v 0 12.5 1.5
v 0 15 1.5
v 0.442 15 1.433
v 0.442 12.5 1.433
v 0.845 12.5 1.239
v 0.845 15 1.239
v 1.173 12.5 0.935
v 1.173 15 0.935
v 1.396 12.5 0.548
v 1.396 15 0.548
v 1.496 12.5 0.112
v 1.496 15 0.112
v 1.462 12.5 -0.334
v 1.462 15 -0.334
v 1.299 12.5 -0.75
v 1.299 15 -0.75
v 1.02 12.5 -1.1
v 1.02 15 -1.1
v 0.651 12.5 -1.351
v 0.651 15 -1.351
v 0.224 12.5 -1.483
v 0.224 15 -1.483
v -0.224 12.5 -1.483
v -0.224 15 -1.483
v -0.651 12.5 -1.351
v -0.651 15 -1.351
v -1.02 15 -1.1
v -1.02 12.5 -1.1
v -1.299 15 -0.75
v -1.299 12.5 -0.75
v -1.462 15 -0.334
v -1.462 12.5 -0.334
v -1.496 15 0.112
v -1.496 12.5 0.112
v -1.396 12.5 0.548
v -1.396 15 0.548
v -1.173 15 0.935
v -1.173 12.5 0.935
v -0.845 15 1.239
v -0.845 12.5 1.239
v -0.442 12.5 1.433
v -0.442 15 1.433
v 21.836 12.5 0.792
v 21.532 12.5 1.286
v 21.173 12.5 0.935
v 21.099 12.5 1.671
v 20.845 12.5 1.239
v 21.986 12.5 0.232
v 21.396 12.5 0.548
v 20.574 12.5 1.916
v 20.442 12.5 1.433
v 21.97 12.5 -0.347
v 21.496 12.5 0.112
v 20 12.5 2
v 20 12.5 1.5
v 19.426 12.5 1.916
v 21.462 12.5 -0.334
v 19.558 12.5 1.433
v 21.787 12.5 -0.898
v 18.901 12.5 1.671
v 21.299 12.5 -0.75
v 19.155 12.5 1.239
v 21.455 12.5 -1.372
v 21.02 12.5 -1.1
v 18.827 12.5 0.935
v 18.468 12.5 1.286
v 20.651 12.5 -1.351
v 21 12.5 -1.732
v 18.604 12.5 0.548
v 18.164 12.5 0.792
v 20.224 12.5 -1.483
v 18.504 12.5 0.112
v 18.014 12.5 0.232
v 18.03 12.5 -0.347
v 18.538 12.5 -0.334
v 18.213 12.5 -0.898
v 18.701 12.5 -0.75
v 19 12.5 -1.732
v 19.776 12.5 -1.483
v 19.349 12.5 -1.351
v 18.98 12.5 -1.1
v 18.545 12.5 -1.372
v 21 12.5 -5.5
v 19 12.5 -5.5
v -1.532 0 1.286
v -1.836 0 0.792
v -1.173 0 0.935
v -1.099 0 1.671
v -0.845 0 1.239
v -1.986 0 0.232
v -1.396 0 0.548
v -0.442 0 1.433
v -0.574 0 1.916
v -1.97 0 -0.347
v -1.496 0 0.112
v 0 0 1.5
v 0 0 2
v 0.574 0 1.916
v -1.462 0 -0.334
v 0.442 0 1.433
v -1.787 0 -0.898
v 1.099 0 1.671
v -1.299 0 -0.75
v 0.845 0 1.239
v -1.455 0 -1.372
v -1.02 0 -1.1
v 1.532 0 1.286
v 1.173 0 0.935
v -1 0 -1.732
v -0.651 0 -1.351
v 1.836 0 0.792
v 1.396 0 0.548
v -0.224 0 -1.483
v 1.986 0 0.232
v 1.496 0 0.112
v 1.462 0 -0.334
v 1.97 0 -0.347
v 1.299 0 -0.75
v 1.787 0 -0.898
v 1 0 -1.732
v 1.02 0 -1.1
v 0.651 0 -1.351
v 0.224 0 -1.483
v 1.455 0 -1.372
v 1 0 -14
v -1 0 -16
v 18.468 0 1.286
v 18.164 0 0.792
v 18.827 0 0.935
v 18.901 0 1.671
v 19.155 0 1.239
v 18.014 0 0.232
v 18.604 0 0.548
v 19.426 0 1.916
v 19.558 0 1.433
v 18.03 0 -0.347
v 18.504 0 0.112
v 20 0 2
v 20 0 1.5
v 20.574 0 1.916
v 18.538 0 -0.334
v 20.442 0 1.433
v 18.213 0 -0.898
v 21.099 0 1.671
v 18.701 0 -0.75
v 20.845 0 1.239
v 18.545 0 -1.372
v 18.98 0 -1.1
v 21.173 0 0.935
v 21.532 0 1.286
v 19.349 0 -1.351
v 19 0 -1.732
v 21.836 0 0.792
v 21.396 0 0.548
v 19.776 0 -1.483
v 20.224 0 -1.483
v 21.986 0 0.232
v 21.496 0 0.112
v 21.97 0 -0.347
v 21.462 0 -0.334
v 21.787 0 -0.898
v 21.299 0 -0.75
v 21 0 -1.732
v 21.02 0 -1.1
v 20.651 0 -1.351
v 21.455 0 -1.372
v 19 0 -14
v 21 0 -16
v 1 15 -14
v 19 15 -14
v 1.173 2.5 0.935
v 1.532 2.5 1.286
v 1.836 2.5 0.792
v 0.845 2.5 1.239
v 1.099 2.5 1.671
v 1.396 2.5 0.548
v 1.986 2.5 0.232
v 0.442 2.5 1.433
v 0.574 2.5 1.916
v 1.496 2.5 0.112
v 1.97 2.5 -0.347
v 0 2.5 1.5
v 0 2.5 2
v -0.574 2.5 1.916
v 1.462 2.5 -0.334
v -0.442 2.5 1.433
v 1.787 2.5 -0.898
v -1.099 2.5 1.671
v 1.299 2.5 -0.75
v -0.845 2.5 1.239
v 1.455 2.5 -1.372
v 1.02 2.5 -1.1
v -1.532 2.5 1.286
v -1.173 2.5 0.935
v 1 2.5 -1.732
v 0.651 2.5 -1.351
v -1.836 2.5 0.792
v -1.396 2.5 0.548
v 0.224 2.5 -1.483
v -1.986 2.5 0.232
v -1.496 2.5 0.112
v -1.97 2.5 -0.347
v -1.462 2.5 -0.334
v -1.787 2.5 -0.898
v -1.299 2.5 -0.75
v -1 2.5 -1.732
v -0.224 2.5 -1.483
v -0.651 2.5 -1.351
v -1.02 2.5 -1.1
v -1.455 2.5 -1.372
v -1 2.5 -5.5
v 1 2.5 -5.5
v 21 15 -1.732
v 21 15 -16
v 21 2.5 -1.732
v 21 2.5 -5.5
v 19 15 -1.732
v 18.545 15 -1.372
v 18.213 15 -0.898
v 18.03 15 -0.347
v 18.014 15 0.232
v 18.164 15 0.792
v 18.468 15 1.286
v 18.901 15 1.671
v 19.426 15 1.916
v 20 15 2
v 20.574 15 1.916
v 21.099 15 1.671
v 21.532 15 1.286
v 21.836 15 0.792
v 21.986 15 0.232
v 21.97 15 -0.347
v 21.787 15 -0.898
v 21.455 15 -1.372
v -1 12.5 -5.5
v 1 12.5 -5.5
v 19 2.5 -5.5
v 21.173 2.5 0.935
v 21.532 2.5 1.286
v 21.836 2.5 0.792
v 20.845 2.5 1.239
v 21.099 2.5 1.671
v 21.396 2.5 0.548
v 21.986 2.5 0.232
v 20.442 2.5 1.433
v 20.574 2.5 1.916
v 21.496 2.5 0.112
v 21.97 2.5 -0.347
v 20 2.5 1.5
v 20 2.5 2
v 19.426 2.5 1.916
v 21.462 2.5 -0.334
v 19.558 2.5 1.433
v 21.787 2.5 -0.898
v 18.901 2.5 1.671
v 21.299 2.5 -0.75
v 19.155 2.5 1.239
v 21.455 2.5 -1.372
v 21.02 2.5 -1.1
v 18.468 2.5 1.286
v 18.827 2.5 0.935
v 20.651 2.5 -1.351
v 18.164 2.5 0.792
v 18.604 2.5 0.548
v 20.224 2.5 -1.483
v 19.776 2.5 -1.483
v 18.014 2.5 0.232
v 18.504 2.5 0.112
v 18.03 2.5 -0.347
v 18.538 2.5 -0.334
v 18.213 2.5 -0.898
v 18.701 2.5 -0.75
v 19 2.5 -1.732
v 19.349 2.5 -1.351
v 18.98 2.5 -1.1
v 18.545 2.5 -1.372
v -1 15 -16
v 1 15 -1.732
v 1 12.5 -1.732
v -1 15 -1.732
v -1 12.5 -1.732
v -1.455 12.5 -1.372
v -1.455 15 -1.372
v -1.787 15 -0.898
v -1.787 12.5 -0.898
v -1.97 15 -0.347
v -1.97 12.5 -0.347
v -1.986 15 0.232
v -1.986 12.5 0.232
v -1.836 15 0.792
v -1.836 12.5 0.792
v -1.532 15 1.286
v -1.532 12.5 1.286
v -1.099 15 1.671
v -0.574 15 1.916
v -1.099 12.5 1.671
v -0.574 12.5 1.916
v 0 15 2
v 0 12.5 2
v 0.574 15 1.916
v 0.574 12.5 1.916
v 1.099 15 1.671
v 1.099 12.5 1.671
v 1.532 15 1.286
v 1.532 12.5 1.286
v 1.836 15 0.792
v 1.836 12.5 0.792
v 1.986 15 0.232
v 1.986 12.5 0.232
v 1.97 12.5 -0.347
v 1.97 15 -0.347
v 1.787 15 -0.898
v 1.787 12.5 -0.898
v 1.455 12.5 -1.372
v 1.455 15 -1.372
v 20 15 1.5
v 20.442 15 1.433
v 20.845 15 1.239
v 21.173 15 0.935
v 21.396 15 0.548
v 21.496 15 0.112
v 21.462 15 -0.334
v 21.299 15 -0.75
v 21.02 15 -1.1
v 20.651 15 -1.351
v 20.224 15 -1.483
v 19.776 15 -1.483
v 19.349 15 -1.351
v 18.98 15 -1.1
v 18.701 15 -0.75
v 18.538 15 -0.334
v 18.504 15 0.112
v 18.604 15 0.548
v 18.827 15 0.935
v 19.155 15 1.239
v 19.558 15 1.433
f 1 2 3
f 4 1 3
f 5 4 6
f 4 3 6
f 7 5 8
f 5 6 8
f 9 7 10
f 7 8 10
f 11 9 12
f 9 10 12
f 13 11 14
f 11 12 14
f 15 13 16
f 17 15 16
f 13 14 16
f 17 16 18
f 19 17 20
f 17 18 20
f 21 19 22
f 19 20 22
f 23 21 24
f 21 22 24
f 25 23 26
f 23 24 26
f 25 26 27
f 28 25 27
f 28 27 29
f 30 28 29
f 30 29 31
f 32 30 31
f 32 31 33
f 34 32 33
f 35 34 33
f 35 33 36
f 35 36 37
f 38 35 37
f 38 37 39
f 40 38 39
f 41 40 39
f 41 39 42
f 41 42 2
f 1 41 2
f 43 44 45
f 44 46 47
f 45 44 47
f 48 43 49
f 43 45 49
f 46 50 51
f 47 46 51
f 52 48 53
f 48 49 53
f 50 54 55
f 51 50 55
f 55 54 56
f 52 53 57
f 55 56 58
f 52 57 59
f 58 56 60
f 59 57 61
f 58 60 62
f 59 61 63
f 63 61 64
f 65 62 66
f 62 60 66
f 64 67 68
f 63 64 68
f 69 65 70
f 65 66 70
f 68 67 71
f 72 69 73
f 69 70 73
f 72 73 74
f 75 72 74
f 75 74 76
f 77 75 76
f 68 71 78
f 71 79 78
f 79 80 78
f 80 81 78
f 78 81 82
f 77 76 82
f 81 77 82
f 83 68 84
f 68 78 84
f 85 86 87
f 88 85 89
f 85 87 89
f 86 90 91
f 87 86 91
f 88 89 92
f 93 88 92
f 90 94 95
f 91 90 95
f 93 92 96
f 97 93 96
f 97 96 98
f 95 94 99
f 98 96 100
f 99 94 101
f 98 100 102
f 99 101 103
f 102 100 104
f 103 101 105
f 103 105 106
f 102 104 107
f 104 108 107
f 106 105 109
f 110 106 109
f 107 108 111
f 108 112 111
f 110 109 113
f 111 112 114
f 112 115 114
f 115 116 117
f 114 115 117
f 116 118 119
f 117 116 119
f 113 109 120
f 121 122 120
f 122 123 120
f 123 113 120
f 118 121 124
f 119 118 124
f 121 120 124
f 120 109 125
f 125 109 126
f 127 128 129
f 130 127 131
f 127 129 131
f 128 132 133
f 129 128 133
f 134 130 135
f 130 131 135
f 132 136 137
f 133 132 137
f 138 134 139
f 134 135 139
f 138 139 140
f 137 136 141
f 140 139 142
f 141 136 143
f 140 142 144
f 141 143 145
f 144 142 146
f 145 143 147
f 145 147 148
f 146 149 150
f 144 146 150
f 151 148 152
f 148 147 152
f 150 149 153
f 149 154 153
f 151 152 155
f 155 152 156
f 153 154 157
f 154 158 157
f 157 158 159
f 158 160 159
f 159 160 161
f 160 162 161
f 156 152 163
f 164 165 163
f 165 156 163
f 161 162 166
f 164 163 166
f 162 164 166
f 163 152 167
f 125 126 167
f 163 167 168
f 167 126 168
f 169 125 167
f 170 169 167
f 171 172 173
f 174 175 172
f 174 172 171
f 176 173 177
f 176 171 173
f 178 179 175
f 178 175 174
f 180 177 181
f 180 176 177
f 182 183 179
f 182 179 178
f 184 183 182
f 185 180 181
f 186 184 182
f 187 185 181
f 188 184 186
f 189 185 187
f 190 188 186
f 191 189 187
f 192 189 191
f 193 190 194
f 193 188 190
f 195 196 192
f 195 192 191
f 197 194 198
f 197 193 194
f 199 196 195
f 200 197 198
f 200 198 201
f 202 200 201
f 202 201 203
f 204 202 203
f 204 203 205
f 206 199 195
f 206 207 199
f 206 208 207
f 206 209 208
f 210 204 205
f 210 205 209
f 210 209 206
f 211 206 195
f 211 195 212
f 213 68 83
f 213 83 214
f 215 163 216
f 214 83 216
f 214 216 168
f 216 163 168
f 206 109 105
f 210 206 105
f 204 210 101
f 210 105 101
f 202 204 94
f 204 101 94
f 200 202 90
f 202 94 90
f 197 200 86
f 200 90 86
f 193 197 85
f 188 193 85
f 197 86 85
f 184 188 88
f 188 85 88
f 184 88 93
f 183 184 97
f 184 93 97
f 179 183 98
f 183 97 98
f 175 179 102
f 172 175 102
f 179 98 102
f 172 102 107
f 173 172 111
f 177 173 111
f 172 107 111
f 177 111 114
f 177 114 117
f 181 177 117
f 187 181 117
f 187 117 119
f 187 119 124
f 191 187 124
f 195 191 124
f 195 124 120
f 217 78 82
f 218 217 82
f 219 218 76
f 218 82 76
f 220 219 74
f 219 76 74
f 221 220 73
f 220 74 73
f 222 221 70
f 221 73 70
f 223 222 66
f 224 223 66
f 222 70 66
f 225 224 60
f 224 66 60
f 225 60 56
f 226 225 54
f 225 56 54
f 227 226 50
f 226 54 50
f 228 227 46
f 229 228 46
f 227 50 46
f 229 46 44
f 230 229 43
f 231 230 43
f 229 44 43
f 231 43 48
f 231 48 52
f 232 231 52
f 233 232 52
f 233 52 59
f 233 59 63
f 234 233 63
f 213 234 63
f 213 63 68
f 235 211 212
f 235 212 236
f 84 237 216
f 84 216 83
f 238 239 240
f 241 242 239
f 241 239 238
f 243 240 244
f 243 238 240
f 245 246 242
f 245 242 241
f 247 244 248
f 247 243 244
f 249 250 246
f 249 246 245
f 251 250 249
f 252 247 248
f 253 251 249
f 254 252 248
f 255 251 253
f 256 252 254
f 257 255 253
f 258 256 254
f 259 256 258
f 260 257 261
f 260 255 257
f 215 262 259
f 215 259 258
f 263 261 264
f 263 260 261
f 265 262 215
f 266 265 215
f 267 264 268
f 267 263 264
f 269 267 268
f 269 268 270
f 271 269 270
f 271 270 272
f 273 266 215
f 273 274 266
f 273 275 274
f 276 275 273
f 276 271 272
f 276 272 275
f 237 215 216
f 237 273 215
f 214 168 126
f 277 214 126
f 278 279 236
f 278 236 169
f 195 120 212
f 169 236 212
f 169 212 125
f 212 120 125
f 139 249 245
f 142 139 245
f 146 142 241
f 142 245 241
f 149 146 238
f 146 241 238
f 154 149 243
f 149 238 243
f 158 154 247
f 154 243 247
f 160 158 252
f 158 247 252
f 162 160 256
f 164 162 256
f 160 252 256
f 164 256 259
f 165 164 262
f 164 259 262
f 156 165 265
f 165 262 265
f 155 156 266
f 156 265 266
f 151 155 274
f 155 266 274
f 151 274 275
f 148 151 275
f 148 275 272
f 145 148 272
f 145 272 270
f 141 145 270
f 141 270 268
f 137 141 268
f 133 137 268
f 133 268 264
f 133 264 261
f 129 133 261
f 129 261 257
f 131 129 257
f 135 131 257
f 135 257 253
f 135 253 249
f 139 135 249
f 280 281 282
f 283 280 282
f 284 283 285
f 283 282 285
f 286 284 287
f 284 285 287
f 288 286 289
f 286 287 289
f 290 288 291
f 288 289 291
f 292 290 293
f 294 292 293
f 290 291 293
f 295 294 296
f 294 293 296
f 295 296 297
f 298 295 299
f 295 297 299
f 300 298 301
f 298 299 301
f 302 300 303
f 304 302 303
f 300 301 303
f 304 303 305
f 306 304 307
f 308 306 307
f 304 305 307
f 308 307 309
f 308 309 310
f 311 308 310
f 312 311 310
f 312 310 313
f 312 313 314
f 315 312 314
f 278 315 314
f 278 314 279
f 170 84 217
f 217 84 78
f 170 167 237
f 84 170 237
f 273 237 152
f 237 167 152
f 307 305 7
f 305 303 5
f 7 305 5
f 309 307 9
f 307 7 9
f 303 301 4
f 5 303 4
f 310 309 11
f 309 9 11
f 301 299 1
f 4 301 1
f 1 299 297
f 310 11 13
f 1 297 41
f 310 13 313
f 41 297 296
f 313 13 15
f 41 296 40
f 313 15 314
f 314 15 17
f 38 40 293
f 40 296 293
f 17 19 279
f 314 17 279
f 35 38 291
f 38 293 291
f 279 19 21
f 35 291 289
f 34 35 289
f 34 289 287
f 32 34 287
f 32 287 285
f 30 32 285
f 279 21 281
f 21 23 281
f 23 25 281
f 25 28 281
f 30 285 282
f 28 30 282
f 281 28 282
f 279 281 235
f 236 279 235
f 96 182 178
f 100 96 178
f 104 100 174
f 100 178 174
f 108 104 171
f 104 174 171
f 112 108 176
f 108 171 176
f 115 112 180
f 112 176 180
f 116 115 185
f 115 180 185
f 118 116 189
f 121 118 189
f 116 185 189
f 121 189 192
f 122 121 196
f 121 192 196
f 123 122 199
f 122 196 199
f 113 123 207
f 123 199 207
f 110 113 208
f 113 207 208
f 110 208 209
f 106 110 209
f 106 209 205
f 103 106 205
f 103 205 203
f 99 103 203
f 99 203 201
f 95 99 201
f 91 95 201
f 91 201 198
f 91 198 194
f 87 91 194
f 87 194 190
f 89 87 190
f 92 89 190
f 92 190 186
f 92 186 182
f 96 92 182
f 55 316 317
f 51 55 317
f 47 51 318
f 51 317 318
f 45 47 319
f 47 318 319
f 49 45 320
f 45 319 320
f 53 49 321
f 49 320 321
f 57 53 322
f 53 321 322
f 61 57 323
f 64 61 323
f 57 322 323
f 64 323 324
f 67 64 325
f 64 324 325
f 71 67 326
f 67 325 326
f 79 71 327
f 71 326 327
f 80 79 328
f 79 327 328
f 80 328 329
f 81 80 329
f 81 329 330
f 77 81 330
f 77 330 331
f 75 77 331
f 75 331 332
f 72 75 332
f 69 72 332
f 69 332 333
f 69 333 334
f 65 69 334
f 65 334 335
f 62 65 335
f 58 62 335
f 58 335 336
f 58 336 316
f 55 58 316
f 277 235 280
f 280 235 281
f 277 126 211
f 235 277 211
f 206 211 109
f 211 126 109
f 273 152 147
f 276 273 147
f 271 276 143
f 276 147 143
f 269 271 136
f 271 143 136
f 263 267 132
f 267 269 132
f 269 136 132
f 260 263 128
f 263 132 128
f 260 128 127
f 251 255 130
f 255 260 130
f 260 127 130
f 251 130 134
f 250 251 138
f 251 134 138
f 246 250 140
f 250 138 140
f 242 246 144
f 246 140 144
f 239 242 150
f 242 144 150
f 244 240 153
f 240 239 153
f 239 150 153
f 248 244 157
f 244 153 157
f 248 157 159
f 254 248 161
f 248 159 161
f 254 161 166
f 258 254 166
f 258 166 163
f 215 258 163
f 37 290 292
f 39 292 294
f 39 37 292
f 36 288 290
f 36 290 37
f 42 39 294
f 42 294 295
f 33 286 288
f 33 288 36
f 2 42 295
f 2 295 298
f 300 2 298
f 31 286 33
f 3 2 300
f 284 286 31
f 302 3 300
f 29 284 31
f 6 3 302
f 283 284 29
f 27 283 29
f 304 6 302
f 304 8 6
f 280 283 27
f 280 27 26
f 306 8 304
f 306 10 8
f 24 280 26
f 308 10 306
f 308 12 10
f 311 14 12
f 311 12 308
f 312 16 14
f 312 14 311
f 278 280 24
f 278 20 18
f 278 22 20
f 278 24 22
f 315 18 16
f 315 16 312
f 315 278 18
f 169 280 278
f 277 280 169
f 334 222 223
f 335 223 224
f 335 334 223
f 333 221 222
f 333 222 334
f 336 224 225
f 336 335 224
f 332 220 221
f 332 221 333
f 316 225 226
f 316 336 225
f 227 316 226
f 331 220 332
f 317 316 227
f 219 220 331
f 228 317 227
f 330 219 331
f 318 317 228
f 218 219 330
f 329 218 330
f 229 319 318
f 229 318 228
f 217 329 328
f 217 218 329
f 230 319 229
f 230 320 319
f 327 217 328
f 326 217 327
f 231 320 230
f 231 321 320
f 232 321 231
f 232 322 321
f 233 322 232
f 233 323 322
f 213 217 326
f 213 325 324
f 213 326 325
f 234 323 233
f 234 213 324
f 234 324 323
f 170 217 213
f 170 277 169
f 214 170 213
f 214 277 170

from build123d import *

# Parameters (mm, degrees)
BOSS_EXTRUDE1_DEPTH     = 15
CUT_EXTRUDE1_DEPTH      = 32.064449134
CUT_EXTRUDE1_DEPTH_BACK = 32.064449134
SKETCH2_W               = 7.5
SKETCH2_H               = 10
SKETCH3_R               = 1.5
CUT_EXTRUDE2_DEPTH      = 32.064449134


with BuildPart() as part:
    # Sketch1 → Boss-Extrude1 (new body)
    with BuildSketch(Plane(origin=(0, 0, 0), x_dir=(1, 0, 0), z_dir=(0, 1, 0))):
        with BuildLine():
            Line((1, 1.732050808), (1, 14))
            Line((1, 14), (19, 14))
            Line((19, 14), (19, 1.732050808))
            ThreePointArc((19, 1.732050808), (20, -2), (21, 1.732050808))
            Line((21, 1.732050808), (21, 16))
            Line((21, 16), (-1, 16))
            Line((-1, 16), (-1, 1.732050808))
            ThreePointArc((-1, 1.732050808), (0, -2), (1, 1.732050808))
        make_face()
    extrude(amount=BOSS_EXTRUDE1_DEPTH)

    # Sketch2 → Cut-Extrude1 (cut, two sides: drawn at the far end of the back side and taken through both)
    with BuildSketch(Plane(origin=(0, 0, 0), x_dir=(0, 0, -1), z_dir=(1, 0, 0)).offset(-CUT_EXTRUDE1_DEPTH_BACK)):
        with Locations((1.75, 7.5)):
            Rectangle(SKETCH2_W, SKETCH2_H)
    extrude(amount=CUT_EXTRUDE1_DEPTH + CUT_EXTRUDE1_DEPTH_BACK, mode=Mode.SUBTRACT)

    # Sketch3 → Cut-Extrude2 (cut, through all)
    with BuildSketch(Plane(origin=(0, 15, 0), x_dir=(1, 0, 0), z_dir=(0, 1, 0))):
        with Locations(Location((0, 0, 0), (0, 0, 270))):
            Circle(SKETCH3_R)
        with Locations(Location((20, 0, 0), (0, 0, 270))):
            Circle(SKETCH3_R)
    extrude(amount=-CUT_EXTRUDE2_DEPTH, mode=Mode.SUBTRACT)


solid = part.part
